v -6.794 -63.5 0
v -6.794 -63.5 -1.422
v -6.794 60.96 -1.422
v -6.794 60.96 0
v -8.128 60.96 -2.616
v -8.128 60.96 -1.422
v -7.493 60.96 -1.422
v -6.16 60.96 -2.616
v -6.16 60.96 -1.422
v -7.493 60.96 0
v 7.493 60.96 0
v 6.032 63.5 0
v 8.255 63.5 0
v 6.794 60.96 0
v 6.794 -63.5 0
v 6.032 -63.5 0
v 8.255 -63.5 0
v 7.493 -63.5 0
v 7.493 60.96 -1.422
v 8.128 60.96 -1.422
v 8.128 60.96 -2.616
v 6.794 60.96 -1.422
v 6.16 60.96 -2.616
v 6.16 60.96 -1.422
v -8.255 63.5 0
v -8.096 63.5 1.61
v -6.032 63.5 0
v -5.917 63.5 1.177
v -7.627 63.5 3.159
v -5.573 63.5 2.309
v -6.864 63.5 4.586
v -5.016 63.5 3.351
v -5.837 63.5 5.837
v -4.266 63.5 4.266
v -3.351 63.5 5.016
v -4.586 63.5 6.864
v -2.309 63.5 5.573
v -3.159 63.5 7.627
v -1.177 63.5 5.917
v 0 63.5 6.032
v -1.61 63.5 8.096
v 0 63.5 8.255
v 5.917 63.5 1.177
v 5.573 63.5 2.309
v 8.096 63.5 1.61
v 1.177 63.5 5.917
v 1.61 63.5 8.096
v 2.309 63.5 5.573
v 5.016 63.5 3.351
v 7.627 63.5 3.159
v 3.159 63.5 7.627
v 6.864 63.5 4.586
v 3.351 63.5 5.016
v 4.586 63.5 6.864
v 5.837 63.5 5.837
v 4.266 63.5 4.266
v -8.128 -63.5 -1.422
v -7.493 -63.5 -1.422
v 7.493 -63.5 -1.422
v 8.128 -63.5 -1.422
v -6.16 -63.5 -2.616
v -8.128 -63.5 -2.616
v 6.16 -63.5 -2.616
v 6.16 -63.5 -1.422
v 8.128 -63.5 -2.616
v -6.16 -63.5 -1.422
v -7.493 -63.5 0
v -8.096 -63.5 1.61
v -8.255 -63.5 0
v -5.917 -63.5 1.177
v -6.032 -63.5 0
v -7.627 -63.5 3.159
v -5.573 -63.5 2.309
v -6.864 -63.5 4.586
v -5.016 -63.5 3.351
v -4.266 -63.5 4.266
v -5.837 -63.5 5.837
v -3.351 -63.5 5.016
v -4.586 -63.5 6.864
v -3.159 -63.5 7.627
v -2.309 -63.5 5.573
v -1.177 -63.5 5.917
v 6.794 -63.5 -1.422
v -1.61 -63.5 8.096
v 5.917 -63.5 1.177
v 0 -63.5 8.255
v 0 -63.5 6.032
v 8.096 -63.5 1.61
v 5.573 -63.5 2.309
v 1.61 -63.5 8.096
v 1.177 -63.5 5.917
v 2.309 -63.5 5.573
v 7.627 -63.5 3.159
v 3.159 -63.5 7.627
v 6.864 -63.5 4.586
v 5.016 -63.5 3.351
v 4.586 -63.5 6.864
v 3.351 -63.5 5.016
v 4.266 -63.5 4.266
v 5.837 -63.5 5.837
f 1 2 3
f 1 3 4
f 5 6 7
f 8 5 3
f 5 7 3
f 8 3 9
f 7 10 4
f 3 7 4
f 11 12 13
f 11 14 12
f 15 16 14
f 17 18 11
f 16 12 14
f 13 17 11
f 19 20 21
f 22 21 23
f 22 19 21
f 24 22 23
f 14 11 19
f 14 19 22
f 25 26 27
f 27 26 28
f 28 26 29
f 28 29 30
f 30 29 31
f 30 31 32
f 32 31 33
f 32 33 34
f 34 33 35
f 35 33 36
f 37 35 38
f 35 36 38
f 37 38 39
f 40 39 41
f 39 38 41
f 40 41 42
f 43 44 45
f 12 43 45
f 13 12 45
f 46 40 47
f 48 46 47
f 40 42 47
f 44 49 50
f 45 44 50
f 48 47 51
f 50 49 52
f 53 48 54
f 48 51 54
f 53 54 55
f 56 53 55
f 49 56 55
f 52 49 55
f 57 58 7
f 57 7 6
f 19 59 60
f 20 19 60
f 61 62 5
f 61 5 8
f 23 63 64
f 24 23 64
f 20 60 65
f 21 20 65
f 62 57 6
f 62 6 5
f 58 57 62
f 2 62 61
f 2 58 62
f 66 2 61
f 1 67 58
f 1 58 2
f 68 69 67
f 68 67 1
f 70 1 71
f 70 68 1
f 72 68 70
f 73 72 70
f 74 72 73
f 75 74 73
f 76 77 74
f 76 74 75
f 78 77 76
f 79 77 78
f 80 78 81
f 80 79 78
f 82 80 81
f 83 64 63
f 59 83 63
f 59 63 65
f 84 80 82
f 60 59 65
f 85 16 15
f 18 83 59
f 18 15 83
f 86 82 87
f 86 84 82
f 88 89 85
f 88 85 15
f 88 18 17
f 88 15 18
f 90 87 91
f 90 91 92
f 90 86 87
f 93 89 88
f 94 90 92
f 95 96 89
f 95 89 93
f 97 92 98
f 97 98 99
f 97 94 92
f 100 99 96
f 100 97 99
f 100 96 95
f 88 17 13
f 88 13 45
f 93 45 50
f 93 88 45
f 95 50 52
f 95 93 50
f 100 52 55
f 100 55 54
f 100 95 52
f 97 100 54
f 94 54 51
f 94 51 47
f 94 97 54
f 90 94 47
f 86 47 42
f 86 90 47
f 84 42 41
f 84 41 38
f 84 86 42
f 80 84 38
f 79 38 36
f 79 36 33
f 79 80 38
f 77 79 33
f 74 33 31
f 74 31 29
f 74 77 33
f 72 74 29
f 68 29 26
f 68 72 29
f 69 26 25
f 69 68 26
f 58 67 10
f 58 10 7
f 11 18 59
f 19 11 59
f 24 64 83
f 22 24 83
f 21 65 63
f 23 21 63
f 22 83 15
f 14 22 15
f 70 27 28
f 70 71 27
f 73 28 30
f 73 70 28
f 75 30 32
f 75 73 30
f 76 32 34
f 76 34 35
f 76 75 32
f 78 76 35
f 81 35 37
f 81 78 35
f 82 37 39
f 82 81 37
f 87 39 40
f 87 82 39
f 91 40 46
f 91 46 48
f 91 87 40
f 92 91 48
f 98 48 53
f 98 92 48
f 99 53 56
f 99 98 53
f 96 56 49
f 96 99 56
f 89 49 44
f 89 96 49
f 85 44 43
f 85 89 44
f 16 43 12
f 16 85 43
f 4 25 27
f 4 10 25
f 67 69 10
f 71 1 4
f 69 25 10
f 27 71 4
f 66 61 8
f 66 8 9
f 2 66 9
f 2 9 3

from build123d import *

# Parameters (mm, degrees)
F1_DEPTH = 63.5
F3_DEPTH = 124.46


# Not quite as in the source:
# - a pattern or mirror of a feature is missing from the dataset's text; its kind, count and spacing are read off the source's solid


with BuildPart() as f1:
    # F0 (on Front) → F1 (new body, symmetric)
    with BuildSketch(Plane.XZ):
        with BuildLine():
            ThreePointArc((-6.0325, 0), (0, 6.0325), (6.0325, 0))
            Line((6.0325, 0), (8.255, 0))
            ThreePointArc((8.255, 0), (0, 8.255), (-8.255, 0))
            Line((-8.255, 0), (-6.0325, 0))
        make_face()
    extrude(amount=F1_DEPTH, both=True)

    # F2 (on face) → F3 (join)
    with BuildSketch(Plane.XZ.offset(63.5)):
        Polygon((-6.7945, 0), (-7.493, 0), (-7.493, -1.4224), (-8.128, -1.4224), (-8.128, -2.6162), (-6.1595, -2.6162), (-6.1595, -1.4224), (-6.7945, -1.4224), align=None)
    f3 = extrude(amount=-F3_DEPTH)

    # F3_copies: F3 across plane
    add(f3.mirror(Plane(origin=(0, 0, 0), x_dir=(0, 0, 1), z_dir=(1, 0, 0))))


solid = f1.part
